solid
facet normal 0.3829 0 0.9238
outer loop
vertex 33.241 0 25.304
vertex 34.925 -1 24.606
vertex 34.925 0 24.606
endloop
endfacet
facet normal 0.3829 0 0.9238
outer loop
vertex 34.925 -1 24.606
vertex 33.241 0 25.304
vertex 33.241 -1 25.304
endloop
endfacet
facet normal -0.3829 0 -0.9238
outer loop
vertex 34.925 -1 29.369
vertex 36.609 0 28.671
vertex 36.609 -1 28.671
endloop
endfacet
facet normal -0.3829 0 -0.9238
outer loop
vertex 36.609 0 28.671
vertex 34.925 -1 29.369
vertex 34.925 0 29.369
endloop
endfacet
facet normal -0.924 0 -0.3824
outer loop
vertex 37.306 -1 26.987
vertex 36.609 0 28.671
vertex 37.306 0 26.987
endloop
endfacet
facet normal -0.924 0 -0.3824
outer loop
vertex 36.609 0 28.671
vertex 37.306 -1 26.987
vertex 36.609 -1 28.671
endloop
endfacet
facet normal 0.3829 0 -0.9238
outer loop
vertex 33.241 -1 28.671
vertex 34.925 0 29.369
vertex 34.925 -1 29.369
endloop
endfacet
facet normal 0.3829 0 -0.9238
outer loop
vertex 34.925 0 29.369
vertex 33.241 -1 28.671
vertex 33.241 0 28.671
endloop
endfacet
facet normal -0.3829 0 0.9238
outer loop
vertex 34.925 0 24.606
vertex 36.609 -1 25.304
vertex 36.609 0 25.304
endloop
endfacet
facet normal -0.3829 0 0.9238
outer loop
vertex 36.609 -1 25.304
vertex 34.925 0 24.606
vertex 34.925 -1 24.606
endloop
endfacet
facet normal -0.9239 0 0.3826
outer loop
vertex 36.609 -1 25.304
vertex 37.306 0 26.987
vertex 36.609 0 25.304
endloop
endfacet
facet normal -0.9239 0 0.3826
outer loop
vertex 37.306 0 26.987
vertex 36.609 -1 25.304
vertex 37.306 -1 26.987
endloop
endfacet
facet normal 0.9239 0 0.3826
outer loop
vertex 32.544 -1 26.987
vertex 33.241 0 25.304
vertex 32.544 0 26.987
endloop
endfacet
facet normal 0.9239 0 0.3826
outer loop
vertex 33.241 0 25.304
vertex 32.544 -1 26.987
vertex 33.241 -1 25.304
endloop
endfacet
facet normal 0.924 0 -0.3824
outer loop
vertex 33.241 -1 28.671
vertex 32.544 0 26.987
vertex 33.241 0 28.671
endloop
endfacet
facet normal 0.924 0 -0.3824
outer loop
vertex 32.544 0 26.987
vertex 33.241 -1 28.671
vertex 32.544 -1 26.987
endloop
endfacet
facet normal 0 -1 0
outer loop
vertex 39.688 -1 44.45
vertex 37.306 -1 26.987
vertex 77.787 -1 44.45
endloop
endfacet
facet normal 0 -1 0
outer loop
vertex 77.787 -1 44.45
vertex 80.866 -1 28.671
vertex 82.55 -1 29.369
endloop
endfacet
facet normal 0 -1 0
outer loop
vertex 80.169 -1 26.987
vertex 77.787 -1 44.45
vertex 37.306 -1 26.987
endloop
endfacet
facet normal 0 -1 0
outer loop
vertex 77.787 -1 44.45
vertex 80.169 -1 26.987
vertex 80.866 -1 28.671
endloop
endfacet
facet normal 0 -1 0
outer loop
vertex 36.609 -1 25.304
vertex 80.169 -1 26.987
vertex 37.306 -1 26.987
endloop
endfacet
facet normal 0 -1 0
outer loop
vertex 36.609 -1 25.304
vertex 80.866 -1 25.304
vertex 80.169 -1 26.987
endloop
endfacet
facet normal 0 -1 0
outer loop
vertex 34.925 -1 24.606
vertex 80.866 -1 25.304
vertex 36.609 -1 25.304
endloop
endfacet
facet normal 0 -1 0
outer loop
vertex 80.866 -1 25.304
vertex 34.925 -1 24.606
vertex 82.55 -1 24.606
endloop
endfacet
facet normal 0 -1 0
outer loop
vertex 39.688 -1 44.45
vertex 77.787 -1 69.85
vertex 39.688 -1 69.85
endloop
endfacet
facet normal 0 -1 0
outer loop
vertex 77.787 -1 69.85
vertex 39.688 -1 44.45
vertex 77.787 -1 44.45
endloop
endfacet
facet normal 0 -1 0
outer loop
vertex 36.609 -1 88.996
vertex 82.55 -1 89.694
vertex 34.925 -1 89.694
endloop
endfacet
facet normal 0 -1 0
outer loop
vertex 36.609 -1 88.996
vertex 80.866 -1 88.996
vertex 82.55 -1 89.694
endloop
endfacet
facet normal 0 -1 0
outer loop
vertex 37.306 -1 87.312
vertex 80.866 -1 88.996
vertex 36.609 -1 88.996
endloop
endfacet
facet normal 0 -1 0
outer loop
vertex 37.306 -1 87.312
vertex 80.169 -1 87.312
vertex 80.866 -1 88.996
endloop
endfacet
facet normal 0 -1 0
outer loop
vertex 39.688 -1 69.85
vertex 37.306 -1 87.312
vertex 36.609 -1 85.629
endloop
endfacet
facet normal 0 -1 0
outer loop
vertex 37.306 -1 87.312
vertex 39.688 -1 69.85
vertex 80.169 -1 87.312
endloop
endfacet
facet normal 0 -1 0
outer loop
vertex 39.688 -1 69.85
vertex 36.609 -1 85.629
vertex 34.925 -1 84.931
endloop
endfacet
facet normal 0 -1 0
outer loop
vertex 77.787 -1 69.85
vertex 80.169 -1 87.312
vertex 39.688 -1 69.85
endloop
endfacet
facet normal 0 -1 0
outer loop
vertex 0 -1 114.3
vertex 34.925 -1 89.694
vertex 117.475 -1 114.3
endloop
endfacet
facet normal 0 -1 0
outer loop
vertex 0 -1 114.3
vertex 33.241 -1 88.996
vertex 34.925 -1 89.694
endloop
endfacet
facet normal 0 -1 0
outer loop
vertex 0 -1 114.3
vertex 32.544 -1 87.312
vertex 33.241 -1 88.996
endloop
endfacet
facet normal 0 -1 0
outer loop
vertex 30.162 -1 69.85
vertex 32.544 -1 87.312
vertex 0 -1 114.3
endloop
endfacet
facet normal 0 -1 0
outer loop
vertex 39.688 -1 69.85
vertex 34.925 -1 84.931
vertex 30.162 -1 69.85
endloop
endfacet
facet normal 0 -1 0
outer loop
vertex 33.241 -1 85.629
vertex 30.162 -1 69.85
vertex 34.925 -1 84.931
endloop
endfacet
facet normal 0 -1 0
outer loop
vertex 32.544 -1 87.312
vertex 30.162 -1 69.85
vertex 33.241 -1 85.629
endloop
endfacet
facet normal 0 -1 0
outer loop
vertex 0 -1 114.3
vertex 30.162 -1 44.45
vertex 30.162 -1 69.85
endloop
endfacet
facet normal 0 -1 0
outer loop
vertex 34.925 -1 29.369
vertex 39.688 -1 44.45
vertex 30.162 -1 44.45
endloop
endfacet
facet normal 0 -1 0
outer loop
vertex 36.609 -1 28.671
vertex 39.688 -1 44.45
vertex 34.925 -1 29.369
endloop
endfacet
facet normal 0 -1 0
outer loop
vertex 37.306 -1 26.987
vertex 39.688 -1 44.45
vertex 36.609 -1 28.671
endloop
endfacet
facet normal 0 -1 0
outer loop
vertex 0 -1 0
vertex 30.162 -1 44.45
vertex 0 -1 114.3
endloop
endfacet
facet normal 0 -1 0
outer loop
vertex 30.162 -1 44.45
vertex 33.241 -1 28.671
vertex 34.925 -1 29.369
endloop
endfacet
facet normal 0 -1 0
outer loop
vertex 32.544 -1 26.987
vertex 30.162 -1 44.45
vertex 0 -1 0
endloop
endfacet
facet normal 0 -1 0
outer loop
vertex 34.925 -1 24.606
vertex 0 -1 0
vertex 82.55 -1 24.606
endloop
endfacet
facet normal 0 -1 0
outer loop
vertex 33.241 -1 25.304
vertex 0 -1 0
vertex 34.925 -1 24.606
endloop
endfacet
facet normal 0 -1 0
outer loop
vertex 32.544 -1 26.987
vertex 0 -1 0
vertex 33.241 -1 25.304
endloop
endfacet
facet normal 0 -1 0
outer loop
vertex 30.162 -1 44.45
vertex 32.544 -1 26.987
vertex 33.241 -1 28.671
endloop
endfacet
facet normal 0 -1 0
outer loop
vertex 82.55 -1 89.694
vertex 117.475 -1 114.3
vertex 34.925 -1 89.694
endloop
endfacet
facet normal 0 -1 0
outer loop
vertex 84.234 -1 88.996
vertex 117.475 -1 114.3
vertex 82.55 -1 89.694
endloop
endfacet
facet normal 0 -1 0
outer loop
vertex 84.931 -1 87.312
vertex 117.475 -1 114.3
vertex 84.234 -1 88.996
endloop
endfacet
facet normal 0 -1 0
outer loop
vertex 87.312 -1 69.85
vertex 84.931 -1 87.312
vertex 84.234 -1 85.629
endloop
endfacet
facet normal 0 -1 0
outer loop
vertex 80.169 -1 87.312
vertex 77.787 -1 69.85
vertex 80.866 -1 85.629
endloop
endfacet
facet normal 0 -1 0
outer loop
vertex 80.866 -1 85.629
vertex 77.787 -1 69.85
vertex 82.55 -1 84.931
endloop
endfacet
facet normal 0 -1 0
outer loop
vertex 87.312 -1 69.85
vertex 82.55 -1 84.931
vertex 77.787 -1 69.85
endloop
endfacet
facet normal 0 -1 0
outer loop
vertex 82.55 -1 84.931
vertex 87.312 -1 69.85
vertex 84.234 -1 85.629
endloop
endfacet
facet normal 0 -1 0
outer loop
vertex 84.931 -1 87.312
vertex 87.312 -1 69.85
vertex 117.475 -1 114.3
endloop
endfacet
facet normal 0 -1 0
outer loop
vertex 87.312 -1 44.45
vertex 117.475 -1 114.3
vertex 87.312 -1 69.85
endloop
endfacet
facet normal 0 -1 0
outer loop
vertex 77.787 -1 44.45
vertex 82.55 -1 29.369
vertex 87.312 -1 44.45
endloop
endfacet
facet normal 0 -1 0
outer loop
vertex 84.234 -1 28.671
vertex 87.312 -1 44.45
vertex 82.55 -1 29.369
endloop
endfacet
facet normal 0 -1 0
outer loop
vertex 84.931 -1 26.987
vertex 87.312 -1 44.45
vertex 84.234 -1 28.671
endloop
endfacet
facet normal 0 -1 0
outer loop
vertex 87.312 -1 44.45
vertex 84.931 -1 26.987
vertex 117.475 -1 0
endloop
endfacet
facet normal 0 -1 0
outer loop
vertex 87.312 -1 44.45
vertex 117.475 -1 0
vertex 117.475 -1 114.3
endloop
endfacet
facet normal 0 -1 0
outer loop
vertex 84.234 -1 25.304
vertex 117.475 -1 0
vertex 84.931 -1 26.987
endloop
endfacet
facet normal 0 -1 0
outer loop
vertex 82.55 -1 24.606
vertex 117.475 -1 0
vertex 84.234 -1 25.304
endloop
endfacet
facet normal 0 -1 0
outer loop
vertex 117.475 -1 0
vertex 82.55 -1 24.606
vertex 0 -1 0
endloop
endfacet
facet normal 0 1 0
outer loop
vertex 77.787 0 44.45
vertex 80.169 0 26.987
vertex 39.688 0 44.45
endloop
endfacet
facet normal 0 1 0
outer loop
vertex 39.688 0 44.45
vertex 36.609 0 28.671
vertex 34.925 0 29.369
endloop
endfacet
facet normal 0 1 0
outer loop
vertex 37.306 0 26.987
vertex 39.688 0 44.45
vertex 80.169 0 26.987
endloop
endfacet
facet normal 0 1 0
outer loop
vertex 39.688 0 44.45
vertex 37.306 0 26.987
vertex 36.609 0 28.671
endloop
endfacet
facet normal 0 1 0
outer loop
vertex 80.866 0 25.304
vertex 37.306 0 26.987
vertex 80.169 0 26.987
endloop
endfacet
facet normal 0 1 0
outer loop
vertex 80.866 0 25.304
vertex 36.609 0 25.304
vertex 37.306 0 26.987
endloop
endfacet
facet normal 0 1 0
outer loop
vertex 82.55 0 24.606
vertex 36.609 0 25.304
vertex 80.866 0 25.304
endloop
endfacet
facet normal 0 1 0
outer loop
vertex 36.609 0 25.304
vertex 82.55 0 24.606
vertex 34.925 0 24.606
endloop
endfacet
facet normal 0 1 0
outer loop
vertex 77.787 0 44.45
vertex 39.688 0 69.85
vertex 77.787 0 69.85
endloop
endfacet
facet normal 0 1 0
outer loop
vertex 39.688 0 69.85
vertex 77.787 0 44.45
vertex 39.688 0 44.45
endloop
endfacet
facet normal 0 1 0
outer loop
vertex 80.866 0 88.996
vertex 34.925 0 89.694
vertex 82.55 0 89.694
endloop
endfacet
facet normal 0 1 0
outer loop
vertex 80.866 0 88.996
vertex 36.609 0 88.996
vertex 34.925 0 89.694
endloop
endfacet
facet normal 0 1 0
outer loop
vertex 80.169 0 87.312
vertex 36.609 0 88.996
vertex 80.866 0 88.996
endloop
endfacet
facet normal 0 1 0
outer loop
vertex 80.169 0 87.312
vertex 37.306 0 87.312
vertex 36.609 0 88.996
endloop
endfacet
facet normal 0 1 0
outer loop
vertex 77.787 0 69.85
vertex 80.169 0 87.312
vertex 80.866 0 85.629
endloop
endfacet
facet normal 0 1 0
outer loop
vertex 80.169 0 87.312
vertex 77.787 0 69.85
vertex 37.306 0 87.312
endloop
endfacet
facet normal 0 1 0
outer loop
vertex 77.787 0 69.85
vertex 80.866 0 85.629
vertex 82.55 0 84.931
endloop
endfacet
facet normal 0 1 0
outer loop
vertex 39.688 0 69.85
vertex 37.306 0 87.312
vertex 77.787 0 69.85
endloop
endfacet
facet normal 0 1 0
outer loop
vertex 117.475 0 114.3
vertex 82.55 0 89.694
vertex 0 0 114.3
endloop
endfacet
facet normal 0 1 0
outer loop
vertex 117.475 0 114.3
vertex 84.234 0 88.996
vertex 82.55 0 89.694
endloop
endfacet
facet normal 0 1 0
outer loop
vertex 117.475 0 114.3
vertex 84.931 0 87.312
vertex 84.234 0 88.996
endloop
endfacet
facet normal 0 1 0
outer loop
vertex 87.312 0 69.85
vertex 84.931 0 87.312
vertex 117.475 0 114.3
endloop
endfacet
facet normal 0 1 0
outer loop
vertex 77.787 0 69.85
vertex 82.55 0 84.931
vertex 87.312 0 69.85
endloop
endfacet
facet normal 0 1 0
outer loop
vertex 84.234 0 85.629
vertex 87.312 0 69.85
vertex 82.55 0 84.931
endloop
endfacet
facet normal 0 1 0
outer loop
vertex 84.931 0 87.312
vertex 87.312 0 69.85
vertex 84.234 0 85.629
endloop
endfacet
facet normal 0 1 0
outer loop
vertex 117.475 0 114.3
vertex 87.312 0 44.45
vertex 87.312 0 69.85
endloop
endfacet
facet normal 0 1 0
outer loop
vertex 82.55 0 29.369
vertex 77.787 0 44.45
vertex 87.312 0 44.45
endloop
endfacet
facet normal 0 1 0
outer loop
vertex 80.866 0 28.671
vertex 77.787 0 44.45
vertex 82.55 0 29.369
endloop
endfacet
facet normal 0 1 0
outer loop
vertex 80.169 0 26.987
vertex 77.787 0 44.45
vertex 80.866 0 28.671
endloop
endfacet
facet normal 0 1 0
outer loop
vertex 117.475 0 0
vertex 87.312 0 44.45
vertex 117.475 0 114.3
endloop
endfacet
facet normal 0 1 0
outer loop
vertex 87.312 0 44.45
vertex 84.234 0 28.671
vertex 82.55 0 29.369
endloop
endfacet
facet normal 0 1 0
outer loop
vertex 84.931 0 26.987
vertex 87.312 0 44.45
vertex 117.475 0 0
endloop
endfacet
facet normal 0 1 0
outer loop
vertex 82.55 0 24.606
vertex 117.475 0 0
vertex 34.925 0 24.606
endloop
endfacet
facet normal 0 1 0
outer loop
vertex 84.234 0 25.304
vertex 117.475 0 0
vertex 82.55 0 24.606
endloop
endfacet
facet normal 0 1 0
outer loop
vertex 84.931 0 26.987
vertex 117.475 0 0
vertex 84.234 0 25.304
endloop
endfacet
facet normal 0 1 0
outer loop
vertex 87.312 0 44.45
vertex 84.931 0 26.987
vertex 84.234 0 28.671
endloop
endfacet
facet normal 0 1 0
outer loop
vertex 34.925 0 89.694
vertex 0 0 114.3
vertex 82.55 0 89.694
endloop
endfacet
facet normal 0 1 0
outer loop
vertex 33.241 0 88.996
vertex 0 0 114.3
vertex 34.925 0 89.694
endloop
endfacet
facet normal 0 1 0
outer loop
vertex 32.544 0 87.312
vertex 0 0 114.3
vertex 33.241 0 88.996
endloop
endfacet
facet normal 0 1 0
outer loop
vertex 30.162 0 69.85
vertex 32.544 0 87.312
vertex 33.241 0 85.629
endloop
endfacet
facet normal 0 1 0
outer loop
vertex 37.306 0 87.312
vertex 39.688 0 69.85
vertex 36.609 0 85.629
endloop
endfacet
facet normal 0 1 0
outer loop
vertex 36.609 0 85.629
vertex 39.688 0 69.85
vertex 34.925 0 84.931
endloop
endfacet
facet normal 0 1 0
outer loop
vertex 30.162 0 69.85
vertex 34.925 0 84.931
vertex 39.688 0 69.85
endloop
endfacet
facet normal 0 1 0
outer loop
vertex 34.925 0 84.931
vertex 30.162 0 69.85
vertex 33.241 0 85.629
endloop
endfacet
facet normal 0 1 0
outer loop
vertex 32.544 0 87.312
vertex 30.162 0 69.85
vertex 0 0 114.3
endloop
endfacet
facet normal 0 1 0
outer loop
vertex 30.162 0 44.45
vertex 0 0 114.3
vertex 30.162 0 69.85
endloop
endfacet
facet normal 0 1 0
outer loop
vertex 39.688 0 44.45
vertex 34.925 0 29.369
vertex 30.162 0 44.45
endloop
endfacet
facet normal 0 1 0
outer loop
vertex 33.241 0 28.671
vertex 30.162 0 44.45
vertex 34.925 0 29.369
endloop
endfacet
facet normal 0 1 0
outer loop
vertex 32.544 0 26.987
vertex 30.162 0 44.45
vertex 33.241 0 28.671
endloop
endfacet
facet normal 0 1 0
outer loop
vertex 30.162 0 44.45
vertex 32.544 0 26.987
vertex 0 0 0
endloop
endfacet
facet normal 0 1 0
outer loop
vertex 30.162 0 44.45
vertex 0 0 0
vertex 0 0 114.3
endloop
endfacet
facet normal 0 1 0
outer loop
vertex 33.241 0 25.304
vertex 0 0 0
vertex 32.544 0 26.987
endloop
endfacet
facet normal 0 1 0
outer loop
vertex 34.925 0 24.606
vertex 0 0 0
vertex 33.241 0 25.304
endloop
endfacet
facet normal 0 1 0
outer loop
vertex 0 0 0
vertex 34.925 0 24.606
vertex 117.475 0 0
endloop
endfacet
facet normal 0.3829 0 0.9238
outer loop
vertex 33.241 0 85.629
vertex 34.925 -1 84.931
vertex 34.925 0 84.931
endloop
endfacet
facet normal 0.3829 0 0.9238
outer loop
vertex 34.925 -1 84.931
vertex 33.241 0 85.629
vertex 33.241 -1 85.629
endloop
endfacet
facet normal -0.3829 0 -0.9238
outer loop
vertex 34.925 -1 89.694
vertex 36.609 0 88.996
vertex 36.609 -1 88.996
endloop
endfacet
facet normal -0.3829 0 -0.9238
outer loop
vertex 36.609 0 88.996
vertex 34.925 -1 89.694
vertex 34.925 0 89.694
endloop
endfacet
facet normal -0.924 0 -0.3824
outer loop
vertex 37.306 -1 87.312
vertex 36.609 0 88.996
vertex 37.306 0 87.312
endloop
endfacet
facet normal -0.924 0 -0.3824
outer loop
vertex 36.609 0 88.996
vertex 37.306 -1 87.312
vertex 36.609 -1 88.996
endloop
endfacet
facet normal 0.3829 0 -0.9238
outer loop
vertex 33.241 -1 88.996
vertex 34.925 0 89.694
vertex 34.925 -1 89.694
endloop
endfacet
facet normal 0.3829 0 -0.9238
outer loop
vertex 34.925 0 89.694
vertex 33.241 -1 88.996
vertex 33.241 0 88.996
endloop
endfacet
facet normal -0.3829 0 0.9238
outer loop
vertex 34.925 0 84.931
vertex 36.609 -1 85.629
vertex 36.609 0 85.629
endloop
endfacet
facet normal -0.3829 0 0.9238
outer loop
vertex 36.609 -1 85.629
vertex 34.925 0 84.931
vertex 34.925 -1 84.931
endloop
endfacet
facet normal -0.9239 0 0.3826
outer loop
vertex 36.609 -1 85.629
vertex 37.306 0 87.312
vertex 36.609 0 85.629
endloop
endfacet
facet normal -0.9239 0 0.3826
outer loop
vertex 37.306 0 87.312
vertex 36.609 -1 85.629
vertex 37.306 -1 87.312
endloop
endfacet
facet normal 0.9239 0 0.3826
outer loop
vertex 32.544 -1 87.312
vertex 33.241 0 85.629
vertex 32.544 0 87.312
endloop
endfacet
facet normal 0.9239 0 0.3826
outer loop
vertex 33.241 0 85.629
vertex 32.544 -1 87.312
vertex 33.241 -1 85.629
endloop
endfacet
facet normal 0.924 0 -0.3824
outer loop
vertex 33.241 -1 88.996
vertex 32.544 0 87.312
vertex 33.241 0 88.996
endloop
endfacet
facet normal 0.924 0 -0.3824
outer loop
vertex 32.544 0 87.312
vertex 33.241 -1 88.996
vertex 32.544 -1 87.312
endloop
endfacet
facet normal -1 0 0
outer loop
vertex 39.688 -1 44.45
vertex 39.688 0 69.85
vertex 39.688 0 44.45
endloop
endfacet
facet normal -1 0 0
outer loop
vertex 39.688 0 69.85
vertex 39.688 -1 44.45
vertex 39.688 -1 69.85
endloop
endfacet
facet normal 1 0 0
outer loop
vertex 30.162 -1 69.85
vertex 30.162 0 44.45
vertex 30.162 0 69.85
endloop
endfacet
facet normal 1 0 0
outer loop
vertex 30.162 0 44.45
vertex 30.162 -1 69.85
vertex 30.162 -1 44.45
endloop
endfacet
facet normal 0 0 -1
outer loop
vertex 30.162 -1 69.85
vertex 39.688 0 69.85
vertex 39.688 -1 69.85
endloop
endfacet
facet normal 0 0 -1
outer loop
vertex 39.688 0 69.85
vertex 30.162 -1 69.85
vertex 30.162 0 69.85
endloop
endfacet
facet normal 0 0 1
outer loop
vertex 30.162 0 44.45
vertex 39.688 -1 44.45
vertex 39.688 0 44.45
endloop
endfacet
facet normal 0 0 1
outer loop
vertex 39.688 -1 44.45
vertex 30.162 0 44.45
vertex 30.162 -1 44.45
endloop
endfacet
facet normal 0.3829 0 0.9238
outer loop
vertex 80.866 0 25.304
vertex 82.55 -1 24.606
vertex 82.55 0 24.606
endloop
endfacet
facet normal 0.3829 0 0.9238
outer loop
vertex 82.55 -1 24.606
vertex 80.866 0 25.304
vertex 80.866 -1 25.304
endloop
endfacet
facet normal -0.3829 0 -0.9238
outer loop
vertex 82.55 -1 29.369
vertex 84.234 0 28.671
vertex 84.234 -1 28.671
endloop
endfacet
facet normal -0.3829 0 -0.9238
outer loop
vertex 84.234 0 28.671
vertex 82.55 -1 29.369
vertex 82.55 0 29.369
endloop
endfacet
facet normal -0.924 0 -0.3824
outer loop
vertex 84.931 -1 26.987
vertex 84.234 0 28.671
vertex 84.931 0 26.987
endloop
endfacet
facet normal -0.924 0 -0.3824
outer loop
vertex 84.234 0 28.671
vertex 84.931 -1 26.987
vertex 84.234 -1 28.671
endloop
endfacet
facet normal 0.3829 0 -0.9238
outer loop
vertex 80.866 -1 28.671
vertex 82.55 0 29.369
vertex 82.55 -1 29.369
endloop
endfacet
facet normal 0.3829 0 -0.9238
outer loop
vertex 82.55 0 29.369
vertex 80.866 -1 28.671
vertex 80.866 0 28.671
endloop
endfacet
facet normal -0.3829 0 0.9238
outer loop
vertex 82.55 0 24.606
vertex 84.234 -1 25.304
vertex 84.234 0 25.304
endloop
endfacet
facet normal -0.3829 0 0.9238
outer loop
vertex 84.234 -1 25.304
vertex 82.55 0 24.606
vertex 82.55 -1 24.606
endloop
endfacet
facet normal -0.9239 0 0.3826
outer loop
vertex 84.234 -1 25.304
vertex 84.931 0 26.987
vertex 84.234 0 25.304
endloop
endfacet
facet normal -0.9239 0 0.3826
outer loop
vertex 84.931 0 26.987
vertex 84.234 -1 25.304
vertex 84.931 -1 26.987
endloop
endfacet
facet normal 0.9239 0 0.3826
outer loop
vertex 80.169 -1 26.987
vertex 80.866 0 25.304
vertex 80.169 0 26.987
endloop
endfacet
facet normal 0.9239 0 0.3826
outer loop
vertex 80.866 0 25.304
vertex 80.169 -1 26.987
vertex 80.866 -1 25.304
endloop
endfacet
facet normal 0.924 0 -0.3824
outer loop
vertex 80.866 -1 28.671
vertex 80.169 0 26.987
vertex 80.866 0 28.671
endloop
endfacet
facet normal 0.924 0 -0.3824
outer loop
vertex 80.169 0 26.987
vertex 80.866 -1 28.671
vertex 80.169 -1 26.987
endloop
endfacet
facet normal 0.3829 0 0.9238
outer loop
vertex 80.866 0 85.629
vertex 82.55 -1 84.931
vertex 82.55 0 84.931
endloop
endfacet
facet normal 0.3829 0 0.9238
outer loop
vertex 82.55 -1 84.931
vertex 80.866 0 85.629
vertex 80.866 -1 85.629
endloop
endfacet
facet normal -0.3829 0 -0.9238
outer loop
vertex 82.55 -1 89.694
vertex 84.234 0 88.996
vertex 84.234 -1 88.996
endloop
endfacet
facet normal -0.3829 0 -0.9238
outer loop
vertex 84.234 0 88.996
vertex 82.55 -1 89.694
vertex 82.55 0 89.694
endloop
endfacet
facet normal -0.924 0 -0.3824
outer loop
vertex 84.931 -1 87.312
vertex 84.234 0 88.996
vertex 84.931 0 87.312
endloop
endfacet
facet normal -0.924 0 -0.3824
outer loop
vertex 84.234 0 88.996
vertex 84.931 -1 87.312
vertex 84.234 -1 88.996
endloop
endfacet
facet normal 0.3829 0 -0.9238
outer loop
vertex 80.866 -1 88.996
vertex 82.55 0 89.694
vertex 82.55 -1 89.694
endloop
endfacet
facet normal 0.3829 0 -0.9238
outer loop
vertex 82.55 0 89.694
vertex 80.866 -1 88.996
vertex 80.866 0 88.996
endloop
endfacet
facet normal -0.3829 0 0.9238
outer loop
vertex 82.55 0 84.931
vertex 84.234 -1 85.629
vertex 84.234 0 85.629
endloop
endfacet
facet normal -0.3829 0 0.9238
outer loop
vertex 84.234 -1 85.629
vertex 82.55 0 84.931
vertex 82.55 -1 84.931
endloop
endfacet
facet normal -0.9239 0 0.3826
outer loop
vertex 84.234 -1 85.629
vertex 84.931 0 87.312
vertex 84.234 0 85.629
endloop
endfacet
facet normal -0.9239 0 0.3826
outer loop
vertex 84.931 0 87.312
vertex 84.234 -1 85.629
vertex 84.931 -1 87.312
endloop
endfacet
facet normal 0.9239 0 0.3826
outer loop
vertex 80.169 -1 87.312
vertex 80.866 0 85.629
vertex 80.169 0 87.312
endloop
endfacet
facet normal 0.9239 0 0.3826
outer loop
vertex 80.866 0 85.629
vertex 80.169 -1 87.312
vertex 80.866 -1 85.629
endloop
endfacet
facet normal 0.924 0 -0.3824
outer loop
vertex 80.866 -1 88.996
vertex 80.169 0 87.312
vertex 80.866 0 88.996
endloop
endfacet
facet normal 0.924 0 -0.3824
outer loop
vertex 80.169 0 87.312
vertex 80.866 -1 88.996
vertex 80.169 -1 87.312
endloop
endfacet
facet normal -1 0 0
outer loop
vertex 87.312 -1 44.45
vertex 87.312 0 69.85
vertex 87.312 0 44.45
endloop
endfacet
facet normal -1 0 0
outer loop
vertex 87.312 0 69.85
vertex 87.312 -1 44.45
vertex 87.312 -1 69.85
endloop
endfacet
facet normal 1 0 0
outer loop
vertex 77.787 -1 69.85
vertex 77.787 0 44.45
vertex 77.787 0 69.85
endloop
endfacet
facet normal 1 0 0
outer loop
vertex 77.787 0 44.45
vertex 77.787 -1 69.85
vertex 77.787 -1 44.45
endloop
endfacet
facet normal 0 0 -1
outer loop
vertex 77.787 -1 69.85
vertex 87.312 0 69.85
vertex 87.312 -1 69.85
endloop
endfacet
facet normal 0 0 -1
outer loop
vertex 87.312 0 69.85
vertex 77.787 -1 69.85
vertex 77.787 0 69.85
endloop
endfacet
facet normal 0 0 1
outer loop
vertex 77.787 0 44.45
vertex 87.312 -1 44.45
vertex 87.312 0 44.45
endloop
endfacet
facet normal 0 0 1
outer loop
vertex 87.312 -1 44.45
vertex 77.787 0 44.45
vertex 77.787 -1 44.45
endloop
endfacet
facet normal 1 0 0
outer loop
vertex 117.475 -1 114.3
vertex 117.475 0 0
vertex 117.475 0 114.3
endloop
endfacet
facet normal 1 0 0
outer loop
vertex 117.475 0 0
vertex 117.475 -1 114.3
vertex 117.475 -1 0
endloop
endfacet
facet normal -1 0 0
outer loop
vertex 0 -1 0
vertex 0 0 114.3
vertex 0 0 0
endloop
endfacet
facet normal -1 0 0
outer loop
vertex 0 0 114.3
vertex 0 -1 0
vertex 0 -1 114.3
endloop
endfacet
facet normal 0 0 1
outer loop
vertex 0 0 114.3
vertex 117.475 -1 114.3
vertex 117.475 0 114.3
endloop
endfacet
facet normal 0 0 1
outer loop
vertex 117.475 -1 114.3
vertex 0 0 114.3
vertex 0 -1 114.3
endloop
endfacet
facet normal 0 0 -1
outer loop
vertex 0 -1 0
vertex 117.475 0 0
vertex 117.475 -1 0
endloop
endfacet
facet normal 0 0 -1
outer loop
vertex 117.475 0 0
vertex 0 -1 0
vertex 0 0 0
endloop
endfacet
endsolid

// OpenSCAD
// file: ../parameters/lightswitch_parameters.scad
// This is a light switch plate parameterized on how many light switches the plate has.
numberOfSwitches = 2;

// These parameters shouldn't change, but are the measurements in inches of the various lengths on a standard light switch.
plateToEdgeSwitchInches = 1.375;
switchToSwitchInches = 1.875;
switchHeightInches = 1;
switchWidthInches = 3/8;
verticalScrewDistanceInches = 2.375;
plateHeightInches = 4.5;
screwDiameterInches = 3/16;

// These are the parameters converted into the metric units used by OpenSCAD
inchesToMm = 25.4;
plateToEdgeSwitch = plateToEdgeSwitchInches * inchesToMm;
switchToSwitch = switchToSwitchInches * inchesToMm;
switchHeight = switchHeightInches * inchesToMm;
switchWidth = switchWidthInches * inchesToMm;
verticalScrewDistance = verticalScrewDistanceInches * inchesToMm;
plateHeight = plateHeightInches * inchesToMm;
screwDiameter = screwDiameterInches * inchesToMm;

// Undefined parameters that I'm guessing at
plateDepth = 1;

// These are the rough millimeter measurements of a light switch.
switchLength = 6.5;
switchDepth = 14;

// These are the rough dimensions of a light switch screw.
screwLength = 13.85;
screwHeadRadius = 6.9/2;
screwHeadHeight = 2.3;
screwBodyRadius = 3.42/2;

switchRotationMultiplier = 30; // This is a multiplier used to get the actual angle of the switches in the switch assembly. It is multiplied by the -1 to 1 angle parameter of the light switch module.

screwVerticalDistanceFromEdge = (plateHeight-verticalScrewDistance)/2;
// main file
include <../parameters/lightswitch_parameters.scad>

module switchPlate(numberOfSwitches=numberOfSwitches, plateToEdgeSwitch=plateToEdgeSwitch, switchToSwitch=switchToSwitch, switchHeight=switchHeight, switchWidth=switchWidth, verticalScrewDistance=verticalScrewDistance, plateHeight=plateHeight, plateDepth=plateDepth, screwDiameter=screwDiameter, screwVerticalDistanceFromEdge=screwVerticalDistanceFromEdge){

    rotate([90, 0, 0]){
        difference(){
            cube([plateToEdgeSwitch*2+(switchToSwitch*(numberOfSwitches-1)), plateHeight, plateDepth]);
            for(index = [0:1:numberOfSwitches-1]){
                // screw hole top
                translate([plateToEdgeSwitch + (index * switchToSwitch), screwVerticalDistanceFromEdge, 0]){
                    cylinder(r1=screwDiameter/2, r2=screwDiameter/2, h=plateDepth);
                }
                // screw hole bottom
                translate([plateToEdgeSwitch + (index * switchToSwitch), plateHeight-screwVerticalDistanceFromEdge, 0]){
                    cylinder(r1=screwDiameter/2, r2=screwDiameter/2, h=plateDepth);
                }
                // switch hole
                translate([plateToEdgeSwitch + (index * switchToSwitch) - switchWidth/2, plateHeight/2 - switchHeight/2, 0]){
                    cube([switchWidth, switchHeight, plateDepth]);
                }
            }
        }
    }
}

switchPlate(numberOfSwitches, plateToEdgeSwitch, switchToSwitch, switchHeight, switchWidth, verticalScrewDistance, plateHeight, plateDepth, screwDiameter);
